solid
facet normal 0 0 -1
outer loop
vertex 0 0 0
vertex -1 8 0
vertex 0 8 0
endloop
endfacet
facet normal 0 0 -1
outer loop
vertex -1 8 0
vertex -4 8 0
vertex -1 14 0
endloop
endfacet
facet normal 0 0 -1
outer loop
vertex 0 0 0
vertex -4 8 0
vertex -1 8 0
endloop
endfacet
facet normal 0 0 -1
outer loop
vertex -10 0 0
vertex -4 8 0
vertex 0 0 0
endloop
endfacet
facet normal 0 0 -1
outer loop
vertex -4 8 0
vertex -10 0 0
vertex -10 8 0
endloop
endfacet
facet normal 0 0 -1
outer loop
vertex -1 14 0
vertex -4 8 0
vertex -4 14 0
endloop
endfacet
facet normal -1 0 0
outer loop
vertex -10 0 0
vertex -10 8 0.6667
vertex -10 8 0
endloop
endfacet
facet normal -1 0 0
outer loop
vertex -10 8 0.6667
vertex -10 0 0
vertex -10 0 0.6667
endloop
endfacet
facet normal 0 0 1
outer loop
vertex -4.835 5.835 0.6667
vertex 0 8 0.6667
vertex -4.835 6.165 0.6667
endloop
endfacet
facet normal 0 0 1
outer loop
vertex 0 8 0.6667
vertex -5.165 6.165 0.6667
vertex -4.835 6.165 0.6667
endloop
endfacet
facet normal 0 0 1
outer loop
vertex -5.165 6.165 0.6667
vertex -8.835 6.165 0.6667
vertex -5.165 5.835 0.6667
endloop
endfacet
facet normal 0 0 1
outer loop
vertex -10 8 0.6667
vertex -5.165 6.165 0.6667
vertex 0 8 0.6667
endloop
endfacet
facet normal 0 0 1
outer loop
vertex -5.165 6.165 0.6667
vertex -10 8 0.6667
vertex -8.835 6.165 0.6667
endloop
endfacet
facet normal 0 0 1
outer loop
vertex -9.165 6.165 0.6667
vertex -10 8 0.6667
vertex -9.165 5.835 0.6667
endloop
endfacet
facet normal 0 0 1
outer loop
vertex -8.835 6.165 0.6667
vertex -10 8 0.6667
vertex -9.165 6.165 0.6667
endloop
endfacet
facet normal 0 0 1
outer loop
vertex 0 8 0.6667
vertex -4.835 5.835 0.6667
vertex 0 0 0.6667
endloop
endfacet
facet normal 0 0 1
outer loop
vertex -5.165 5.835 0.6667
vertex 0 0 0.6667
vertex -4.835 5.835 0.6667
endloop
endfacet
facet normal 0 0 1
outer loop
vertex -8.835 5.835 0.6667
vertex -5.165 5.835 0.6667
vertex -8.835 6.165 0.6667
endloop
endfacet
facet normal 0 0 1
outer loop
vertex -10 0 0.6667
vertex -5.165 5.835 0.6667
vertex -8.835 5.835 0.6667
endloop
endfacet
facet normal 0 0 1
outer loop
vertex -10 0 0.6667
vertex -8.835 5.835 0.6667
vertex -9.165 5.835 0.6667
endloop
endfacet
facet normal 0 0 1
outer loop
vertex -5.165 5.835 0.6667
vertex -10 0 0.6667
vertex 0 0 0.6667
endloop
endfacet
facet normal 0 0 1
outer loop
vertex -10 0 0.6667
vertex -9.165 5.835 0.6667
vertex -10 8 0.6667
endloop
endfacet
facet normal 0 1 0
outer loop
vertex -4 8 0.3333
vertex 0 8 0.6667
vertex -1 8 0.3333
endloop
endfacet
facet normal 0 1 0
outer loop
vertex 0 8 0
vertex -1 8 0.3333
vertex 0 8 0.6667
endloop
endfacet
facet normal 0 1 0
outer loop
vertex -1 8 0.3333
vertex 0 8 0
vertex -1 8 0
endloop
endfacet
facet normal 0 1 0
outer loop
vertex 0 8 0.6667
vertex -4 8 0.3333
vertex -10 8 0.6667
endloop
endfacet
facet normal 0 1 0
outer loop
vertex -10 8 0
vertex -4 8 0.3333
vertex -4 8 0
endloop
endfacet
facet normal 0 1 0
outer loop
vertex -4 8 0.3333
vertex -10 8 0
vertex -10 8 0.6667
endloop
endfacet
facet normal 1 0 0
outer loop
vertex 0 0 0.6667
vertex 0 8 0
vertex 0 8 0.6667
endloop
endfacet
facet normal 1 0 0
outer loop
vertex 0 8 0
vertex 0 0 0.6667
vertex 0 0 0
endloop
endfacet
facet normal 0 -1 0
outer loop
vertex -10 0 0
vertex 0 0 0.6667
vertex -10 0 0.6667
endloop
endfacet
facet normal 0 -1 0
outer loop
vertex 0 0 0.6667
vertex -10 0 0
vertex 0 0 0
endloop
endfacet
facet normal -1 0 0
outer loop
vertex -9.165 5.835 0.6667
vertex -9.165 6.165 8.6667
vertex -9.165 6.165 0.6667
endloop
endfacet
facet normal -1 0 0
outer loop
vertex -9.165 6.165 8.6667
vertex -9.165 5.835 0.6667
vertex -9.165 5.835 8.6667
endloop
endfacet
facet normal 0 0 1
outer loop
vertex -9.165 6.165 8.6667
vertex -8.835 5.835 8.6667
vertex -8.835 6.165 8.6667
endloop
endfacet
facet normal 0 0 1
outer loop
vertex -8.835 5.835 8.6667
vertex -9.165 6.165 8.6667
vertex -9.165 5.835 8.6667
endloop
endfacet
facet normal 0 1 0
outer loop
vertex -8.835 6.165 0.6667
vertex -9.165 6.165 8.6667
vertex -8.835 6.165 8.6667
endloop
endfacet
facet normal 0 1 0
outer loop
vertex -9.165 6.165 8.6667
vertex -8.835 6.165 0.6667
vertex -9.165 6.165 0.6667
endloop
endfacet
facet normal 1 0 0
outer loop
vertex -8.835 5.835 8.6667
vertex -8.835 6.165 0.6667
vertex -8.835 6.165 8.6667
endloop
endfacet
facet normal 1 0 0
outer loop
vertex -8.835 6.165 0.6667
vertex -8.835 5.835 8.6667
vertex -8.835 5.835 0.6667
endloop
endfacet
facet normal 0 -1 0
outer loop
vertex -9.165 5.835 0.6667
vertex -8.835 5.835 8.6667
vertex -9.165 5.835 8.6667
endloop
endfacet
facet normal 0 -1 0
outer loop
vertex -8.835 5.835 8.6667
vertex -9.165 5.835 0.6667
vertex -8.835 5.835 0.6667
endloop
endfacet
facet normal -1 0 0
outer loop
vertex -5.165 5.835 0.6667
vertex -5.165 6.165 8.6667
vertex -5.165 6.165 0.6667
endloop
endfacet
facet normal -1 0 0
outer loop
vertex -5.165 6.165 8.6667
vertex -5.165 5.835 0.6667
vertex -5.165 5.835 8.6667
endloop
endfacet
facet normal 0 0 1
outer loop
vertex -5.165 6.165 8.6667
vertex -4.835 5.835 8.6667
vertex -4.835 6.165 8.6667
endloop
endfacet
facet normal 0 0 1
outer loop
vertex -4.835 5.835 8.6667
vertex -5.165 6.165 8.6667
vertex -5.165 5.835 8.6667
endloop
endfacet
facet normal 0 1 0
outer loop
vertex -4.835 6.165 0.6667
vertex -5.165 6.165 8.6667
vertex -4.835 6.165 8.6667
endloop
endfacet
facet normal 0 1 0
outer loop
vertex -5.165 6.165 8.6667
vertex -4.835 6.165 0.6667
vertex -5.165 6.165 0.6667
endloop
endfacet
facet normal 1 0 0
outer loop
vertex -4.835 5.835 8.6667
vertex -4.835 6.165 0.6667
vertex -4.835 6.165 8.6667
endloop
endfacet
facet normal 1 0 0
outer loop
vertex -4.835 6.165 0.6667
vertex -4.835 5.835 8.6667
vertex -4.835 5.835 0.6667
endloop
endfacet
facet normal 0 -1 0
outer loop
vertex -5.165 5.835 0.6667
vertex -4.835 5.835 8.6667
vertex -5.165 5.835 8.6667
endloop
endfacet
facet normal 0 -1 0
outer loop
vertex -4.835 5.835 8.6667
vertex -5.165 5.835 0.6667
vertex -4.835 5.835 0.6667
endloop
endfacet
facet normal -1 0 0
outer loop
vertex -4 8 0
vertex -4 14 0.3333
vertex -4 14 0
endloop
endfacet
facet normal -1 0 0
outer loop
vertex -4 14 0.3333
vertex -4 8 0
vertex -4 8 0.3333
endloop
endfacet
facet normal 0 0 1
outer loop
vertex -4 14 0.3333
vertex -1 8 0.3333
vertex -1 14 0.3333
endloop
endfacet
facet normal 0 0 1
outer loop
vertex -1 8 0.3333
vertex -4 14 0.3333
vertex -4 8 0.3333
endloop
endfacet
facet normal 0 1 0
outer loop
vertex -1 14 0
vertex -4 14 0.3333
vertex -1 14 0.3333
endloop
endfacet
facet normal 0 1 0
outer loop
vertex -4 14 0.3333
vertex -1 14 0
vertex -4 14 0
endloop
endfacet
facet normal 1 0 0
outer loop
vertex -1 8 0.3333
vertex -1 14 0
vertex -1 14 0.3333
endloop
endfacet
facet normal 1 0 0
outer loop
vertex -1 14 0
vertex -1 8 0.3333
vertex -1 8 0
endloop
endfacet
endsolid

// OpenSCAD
//dimensions of  patio
w = 10;
d = 8;
t = 8/12;

// existing slab
color("gray")
    translate([-w, 0, 0])
        linear_extrude(height = t)
            square([w, d], center = false);
            
// pillar 1
color("black")
    translate([-w+1, 6, t])
        linear_extrude(height = 8)
            square([.33,.33], center = true);
            
// pillar 2
color("black")
    translate([-w+1+4, 6, t])
        linear_extrude(height = 8)
            square([.33,.33], center = true);
            
            
// path
color("gray")
    translate([-4, d, 0])
        linear_extrude(height = t/2)
            square([3, 6], center = false);
